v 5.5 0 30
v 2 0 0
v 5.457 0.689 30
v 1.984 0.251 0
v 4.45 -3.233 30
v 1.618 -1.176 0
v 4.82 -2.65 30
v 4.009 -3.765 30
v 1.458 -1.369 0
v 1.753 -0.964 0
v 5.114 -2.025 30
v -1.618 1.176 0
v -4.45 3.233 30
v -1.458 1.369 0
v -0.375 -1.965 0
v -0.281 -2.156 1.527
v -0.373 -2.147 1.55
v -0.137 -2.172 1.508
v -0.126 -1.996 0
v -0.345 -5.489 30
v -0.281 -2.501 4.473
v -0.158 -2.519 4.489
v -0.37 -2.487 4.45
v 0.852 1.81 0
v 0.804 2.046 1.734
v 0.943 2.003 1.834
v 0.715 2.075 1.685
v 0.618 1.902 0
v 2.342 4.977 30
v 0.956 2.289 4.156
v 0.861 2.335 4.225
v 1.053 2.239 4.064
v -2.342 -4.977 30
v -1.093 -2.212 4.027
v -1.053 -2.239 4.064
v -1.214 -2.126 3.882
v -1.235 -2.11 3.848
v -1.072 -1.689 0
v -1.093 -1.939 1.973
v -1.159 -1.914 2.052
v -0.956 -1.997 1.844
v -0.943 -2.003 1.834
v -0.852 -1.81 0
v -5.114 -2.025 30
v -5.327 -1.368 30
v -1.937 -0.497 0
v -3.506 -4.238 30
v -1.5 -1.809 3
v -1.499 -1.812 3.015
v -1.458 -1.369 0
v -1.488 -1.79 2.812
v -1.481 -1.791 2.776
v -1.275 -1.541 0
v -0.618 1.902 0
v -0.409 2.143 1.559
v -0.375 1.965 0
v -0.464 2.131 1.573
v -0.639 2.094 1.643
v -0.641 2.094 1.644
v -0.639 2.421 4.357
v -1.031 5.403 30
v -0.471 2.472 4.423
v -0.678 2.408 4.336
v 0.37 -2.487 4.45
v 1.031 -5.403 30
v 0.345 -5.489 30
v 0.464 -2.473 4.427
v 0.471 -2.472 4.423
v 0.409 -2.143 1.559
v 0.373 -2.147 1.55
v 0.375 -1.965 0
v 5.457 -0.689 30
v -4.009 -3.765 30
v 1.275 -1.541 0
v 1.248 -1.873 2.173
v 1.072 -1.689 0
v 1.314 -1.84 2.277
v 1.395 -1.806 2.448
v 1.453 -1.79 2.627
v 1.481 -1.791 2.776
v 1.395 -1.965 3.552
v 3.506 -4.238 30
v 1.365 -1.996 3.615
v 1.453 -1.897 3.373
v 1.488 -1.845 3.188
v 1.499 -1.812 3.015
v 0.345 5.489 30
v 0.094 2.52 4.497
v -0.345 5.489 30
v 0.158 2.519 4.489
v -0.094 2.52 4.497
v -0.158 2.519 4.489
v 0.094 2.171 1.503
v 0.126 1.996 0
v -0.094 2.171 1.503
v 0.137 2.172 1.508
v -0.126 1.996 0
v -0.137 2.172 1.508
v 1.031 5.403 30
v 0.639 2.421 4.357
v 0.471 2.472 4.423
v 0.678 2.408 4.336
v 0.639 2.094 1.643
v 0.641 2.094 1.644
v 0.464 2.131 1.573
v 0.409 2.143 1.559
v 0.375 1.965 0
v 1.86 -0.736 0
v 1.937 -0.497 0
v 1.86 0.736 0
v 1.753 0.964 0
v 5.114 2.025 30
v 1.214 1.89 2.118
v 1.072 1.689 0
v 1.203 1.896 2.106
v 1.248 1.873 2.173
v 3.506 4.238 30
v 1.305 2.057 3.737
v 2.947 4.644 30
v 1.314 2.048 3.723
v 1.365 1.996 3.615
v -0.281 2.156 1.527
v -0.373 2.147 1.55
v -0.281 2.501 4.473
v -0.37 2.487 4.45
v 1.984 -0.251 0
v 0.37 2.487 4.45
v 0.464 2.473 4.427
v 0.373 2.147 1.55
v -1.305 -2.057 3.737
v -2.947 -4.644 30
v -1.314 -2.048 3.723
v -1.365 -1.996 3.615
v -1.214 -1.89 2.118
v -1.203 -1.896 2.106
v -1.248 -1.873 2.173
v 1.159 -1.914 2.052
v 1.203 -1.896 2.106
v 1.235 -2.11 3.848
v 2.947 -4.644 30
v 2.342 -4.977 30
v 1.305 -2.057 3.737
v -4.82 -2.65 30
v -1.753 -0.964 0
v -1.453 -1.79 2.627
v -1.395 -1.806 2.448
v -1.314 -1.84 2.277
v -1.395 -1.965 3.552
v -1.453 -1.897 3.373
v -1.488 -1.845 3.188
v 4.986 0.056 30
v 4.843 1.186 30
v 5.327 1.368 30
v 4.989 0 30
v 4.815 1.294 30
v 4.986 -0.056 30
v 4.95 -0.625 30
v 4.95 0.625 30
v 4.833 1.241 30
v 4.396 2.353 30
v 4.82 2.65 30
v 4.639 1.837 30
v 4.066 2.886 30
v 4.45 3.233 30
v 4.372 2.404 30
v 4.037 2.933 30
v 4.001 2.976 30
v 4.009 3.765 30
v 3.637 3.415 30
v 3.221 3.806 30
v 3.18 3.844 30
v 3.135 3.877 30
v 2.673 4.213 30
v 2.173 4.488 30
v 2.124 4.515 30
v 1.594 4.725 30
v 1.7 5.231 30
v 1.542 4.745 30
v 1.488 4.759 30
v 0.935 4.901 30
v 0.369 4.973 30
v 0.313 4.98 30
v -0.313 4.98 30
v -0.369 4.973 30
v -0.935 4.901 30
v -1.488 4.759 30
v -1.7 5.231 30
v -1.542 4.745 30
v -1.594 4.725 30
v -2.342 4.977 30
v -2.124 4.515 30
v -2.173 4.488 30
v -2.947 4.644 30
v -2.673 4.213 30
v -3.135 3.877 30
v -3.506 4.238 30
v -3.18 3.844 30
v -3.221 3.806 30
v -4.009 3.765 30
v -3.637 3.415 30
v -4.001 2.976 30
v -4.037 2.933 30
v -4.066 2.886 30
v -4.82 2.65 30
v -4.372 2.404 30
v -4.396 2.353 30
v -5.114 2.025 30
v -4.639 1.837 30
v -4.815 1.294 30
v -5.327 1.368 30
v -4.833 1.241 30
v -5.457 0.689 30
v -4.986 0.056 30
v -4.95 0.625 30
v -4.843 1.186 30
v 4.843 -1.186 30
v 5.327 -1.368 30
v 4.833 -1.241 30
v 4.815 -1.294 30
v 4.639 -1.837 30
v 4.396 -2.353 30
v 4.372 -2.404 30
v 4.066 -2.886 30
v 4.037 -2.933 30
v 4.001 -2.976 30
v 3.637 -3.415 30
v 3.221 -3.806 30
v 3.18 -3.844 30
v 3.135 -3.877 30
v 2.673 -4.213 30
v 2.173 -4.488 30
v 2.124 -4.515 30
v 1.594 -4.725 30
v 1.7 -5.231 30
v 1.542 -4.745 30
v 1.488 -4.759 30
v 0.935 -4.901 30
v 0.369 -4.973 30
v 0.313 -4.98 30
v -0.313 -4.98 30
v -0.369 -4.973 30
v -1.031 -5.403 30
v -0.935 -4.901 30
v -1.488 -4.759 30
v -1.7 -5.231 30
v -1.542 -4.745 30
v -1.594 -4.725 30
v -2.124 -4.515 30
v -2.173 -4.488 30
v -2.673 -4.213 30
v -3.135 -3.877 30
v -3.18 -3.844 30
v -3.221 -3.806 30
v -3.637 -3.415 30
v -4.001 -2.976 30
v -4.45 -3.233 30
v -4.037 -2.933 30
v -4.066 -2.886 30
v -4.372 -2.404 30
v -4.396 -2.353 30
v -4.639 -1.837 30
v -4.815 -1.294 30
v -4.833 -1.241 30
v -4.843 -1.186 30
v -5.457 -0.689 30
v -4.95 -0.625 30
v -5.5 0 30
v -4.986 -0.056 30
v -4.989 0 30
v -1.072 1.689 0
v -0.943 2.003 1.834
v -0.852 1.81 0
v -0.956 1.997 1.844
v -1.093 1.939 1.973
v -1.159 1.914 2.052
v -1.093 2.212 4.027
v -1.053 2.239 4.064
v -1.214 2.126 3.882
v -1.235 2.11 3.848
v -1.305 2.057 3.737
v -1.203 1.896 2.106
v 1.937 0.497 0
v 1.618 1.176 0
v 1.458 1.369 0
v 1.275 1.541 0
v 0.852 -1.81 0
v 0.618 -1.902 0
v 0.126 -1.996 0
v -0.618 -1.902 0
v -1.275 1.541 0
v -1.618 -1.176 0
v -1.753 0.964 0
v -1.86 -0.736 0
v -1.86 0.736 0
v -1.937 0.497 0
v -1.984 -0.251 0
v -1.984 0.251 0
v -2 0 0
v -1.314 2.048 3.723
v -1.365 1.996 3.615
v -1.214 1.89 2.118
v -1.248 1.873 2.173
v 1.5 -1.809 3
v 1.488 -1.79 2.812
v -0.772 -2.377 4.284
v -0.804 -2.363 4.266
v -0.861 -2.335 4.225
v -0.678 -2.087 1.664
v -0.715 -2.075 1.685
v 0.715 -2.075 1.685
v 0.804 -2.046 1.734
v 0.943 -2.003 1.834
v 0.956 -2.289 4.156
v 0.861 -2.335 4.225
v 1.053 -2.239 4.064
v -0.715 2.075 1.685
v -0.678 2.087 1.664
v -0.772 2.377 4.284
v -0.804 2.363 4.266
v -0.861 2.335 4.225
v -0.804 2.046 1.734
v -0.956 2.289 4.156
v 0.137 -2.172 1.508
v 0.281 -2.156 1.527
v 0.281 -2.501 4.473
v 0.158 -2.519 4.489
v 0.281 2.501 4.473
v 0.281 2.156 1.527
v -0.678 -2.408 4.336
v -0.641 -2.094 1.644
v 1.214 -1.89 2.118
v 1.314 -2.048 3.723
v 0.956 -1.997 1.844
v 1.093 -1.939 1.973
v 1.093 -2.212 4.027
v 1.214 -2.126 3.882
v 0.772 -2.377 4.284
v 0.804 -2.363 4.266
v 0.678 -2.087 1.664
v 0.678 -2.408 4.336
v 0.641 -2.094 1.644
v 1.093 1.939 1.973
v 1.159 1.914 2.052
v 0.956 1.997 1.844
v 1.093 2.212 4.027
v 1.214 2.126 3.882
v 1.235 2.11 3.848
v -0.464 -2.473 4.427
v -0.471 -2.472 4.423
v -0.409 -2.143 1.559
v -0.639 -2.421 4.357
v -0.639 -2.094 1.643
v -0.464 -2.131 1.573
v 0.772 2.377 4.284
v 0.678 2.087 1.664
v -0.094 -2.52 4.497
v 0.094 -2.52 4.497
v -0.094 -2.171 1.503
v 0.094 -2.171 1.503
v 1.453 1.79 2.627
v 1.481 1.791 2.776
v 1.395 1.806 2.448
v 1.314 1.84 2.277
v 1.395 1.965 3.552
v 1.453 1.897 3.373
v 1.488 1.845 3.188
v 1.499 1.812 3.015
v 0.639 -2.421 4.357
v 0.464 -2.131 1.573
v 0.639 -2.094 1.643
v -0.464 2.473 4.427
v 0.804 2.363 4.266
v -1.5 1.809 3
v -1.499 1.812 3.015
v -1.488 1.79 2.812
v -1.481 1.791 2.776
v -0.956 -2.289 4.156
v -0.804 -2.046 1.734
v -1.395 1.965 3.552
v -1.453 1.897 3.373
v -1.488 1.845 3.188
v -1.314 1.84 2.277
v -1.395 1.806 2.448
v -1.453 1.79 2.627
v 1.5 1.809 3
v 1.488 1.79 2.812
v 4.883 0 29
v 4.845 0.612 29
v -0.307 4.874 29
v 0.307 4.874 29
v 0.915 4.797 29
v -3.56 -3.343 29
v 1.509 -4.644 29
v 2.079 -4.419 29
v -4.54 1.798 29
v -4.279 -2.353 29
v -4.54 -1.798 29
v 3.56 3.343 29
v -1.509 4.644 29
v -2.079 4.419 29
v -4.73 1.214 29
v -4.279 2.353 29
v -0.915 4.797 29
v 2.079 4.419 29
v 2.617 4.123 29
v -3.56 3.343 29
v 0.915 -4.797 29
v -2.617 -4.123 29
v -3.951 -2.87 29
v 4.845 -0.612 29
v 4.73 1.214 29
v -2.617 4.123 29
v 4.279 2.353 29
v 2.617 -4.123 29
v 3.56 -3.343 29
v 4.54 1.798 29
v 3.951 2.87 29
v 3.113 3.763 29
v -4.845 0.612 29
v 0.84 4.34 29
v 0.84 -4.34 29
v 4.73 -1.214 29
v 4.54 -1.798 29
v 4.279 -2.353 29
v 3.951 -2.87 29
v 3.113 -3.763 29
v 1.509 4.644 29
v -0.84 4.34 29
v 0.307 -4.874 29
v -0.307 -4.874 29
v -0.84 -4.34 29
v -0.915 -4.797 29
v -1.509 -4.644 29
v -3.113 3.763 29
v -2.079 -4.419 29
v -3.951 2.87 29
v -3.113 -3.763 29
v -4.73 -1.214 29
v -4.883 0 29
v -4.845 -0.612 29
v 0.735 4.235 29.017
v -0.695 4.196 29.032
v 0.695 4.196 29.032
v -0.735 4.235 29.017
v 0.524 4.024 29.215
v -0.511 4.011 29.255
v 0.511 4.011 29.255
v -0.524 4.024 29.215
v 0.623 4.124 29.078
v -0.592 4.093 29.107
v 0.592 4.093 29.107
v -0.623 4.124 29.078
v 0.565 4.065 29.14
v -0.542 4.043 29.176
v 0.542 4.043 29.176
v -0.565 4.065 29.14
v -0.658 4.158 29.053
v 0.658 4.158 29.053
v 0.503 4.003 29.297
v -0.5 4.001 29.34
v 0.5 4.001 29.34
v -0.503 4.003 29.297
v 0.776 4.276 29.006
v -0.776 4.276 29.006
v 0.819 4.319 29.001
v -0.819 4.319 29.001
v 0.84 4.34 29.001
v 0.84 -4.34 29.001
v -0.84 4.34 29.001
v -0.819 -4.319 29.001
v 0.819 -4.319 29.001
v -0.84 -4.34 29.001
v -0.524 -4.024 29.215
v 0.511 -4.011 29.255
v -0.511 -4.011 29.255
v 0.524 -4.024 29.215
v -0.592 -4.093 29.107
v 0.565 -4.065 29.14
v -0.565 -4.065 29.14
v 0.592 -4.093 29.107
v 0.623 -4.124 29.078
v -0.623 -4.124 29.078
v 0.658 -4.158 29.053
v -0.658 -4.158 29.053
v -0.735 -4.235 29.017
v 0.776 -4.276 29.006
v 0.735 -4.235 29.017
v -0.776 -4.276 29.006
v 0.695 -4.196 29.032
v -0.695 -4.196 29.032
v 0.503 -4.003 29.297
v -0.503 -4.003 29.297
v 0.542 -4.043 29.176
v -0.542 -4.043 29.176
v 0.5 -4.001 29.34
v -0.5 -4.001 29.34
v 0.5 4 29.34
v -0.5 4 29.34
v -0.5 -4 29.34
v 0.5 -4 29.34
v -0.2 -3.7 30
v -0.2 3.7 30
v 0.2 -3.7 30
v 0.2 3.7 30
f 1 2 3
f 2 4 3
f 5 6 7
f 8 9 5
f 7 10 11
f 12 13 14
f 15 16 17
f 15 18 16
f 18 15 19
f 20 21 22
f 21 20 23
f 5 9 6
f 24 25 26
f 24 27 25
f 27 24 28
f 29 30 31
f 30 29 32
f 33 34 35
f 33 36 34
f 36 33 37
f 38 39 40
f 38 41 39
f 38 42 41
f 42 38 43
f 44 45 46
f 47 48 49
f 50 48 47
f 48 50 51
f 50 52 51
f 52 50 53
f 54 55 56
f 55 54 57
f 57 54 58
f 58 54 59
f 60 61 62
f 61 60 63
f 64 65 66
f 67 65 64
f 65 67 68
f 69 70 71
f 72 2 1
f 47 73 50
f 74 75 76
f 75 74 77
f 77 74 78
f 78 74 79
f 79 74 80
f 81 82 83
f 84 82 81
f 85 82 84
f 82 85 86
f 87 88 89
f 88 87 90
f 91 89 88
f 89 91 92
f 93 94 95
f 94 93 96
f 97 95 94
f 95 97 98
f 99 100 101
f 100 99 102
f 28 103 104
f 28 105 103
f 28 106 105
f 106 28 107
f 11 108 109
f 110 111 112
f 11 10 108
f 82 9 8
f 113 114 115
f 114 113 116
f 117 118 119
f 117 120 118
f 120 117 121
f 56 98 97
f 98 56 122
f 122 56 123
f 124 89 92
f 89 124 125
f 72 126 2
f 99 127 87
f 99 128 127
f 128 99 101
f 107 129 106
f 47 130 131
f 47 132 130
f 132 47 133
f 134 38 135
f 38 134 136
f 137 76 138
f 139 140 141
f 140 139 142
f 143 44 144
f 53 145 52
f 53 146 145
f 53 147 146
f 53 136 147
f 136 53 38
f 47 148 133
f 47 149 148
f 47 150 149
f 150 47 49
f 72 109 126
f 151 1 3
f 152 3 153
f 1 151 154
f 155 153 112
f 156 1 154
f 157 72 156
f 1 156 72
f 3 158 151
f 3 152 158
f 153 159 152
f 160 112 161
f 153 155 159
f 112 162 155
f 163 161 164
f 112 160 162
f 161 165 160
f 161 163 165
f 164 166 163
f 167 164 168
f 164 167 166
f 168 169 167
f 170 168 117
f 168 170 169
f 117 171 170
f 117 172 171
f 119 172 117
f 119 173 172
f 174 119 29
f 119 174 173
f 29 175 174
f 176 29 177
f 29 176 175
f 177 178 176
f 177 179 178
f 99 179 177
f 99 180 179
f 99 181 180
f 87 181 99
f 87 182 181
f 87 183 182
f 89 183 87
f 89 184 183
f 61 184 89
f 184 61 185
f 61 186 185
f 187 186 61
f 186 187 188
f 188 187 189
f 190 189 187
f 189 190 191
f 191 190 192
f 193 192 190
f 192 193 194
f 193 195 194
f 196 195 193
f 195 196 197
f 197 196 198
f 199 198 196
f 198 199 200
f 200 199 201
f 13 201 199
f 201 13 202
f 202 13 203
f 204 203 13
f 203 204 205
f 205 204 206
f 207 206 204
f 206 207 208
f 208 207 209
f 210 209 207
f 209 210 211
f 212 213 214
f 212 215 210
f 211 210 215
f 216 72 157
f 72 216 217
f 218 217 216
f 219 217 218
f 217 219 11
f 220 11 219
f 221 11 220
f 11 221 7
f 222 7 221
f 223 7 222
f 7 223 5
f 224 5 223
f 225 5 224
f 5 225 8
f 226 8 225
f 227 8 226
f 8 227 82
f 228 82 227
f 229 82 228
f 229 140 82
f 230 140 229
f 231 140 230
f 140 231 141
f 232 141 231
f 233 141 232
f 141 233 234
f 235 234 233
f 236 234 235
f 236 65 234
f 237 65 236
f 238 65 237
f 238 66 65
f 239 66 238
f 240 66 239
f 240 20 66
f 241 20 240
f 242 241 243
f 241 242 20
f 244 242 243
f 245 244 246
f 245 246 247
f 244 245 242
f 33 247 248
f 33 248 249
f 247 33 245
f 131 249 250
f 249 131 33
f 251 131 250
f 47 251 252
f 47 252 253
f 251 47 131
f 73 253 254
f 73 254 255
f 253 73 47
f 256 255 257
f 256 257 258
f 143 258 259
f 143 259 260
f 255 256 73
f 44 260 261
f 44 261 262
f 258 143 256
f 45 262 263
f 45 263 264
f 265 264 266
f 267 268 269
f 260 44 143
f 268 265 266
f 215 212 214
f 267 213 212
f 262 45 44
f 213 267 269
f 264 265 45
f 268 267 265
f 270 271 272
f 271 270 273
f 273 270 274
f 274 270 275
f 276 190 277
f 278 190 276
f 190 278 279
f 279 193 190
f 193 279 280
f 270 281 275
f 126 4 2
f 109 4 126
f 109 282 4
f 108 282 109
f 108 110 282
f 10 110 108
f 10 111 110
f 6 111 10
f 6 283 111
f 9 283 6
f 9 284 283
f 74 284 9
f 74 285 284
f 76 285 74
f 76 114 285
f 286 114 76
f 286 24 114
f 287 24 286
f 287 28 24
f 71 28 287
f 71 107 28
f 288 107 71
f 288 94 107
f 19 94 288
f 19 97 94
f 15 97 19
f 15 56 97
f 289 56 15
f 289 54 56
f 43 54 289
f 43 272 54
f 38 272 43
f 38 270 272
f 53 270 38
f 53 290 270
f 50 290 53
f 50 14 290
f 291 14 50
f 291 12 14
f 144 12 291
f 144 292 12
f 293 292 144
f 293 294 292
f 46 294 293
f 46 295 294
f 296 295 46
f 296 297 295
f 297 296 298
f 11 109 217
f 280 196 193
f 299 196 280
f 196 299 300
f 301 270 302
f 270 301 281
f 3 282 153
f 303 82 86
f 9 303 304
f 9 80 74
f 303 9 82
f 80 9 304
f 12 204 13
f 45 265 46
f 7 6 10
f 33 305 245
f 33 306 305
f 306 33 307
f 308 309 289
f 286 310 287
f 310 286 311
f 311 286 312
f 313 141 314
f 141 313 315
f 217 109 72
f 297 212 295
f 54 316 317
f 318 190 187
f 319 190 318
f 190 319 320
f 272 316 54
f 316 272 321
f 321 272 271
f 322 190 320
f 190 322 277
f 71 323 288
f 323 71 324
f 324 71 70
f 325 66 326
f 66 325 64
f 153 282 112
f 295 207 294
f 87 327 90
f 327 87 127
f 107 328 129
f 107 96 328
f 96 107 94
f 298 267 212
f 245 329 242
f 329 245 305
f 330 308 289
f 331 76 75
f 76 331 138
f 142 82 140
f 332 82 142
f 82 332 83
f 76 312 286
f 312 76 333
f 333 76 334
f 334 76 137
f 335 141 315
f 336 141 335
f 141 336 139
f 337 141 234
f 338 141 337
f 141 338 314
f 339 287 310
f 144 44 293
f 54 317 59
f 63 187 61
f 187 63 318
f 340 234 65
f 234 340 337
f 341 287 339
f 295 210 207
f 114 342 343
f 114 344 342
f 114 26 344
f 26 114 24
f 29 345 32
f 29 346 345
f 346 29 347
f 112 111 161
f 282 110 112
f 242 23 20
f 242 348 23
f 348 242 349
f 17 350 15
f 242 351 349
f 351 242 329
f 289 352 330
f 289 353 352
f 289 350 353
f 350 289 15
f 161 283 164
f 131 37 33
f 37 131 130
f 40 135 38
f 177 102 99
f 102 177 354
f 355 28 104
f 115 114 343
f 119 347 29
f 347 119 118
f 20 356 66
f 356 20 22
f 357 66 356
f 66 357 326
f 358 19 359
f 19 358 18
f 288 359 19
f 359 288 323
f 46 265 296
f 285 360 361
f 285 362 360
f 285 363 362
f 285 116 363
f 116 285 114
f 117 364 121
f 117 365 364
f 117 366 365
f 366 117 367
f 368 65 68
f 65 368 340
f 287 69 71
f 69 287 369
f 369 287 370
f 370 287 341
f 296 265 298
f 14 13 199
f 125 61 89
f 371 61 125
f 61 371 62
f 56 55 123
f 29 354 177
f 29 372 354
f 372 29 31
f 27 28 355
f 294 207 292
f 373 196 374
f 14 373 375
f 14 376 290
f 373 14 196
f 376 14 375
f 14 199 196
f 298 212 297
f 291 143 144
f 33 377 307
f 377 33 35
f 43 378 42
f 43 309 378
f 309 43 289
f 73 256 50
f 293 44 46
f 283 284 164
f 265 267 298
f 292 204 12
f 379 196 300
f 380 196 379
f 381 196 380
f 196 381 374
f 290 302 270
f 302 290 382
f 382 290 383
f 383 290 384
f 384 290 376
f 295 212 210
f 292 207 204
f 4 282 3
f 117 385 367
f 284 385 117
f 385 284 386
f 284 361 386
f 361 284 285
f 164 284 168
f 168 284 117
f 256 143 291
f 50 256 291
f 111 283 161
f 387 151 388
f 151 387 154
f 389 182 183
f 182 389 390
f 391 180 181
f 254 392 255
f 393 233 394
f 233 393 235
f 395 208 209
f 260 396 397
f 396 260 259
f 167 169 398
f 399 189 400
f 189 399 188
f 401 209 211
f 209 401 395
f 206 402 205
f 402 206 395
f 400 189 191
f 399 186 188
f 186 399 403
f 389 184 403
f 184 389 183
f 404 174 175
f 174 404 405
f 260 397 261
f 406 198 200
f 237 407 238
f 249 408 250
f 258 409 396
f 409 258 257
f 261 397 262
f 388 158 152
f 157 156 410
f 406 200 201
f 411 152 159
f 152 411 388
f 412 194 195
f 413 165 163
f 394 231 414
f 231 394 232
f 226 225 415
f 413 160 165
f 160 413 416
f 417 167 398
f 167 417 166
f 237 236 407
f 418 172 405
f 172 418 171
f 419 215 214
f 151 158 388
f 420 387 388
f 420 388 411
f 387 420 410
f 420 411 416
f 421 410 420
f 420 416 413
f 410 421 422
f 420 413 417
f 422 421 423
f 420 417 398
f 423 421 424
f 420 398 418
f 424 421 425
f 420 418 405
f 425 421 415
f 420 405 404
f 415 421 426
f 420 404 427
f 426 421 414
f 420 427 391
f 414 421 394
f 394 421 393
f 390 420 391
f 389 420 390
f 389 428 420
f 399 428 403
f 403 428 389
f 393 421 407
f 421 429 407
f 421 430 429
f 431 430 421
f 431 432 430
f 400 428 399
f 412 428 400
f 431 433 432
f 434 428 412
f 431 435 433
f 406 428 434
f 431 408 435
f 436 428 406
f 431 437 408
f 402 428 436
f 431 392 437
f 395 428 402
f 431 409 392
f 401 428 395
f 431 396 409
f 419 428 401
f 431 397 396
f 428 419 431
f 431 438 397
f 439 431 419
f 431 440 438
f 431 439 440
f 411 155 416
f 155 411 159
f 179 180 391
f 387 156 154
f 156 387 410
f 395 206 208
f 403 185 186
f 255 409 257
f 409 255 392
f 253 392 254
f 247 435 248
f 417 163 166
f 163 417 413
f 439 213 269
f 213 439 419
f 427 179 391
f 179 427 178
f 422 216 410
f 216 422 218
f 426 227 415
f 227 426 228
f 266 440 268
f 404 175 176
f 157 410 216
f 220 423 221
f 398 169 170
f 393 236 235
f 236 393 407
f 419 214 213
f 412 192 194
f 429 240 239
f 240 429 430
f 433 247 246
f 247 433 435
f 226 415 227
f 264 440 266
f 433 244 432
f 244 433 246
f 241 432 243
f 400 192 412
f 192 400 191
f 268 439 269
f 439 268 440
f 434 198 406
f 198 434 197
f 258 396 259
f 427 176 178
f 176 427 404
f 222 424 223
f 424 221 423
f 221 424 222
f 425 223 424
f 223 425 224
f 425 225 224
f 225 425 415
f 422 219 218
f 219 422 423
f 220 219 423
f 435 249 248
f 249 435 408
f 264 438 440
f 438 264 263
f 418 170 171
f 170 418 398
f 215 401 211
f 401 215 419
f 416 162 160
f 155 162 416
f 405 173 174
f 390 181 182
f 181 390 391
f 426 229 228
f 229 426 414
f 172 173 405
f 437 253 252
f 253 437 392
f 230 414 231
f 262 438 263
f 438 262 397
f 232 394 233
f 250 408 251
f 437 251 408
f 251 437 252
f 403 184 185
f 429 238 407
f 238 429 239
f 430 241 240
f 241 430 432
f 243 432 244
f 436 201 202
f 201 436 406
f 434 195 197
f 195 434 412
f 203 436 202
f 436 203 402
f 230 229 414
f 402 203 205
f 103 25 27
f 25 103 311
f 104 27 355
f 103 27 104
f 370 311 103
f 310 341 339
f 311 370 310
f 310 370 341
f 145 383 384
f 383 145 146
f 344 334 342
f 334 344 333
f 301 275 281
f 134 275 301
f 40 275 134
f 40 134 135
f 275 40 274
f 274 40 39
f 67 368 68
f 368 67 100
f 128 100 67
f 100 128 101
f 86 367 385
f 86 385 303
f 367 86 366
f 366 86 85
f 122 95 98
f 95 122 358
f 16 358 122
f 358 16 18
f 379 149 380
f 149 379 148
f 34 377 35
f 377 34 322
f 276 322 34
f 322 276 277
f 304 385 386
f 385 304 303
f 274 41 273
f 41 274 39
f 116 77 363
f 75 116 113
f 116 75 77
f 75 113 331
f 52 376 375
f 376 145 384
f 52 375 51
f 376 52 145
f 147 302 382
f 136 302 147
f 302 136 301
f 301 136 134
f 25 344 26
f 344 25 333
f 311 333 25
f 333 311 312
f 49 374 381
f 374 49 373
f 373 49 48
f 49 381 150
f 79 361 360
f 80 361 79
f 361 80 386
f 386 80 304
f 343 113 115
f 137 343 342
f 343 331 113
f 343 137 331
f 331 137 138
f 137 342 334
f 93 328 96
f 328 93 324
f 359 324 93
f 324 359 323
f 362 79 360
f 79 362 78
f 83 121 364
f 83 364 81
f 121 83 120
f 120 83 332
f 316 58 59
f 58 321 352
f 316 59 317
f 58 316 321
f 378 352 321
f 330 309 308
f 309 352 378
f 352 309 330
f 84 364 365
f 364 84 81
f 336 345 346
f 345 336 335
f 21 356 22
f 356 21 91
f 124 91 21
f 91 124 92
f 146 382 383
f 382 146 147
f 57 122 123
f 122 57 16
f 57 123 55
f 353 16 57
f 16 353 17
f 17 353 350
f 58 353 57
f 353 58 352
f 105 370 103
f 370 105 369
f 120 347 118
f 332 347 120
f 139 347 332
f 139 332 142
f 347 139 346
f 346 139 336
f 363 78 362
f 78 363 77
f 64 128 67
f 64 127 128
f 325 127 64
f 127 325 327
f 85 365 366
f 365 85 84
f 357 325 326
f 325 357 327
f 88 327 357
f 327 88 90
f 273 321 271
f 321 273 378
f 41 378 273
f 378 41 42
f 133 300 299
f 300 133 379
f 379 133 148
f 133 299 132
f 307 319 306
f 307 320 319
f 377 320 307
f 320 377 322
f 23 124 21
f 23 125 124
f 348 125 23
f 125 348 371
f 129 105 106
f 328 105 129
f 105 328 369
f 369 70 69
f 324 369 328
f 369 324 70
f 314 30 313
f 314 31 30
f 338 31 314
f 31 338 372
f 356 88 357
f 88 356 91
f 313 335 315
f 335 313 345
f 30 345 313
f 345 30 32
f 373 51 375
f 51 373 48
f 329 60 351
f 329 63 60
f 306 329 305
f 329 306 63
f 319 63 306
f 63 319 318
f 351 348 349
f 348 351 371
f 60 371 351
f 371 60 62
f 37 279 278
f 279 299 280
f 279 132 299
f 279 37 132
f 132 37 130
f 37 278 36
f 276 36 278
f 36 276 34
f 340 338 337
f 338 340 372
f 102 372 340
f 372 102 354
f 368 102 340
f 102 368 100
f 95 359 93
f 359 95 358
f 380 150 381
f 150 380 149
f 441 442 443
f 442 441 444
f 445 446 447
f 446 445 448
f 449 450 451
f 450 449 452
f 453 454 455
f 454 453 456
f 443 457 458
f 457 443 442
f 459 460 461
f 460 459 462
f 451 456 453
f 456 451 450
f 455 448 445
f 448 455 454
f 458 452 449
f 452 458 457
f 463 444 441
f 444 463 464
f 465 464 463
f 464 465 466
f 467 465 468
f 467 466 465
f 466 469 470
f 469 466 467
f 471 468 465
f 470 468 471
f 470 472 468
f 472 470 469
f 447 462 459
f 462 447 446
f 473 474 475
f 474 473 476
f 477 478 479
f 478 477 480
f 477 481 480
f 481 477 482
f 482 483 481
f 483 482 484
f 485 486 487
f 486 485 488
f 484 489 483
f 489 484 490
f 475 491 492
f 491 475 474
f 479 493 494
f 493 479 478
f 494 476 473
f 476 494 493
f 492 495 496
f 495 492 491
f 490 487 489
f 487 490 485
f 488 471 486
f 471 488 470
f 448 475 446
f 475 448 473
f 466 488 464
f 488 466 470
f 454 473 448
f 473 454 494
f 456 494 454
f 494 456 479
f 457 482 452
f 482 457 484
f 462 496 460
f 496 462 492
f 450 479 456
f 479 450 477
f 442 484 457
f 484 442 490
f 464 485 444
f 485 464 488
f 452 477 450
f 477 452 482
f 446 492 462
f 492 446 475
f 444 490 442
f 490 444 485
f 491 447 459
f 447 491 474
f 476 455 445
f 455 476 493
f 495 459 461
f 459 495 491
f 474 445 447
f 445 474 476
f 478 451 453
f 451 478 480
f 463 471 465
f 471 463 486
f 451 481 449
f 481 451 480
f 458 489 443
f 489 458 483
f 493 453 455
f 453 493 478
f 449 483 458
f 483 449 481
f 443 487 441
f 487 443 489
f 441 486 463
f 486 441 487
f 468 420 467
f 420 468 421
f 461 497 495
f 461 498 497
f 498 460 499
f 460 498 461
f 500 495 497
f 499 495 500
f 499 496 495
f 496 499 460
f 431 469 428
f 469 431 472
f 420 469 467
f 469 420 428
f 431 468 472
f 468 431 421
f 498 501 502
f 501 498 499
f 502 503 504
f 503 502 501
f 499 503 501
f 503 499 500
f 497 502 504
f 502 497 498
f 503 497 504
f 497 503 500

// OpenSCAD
//  The amount of edges in every circle
$fn = 50;

//  The outer radius of the cylinder
Ro = 5.5;

//  The inner radius of the cylinder
Ri = 5;

//  The bottom outer radius, the whole thing will be scaled to this
Rb = 2;

//  The height of the cylinder
H = 30;

//  The depth of the cut out for the driver
depth = 1;

//  The height of the tapering part of the top of the driver
tapered = 0.66;

//  The decrease in dimension of the top part
decrease = 0.3;

//  The radius of the fillet at the bottom of the driver
fillet = 0.34;

//  The width of the base of the driver, must be smaller than 2 * Ri
driverBaseWidth = 1;

//  The length of the base of the driver, must be smaller than 2 * Ri
driverBaseLength = 8;

//  The height of the keychain hole
keyChainHeight = 3;

//  The radius of the keychain hole
keyChainRadius = 1.5;

module keyChainIdleScrewDriver(){
    delta = 0.0001;
    union(){
        difference(){
            cylinder(r1 = Rb, r2 = Ro, h = H);
            translate([0,0,H - depth]){
                cylinder(r1 = (Ro - Rb) / H * (H - depth) + Rb - Ro + Ri, r2 = Ri, h = depth + 0.1);
            }
            translate([0, -Ro - 0.1, keyChainHeight]){
                rotate([-90,0,0]){
                    cylinder(r = keyChainRadius, h = 2 * Ro + 0.2);
                }
            }
        }        
        translate([0,0,H - depth]){
            union(){
                difference(){
                    cube([driverBaseWidth + 2 * fillet, driverBaseLength + 2 * fillet, 2 * fillet], center = true);
                    translate([0,0, 2 * fillet]){
                        minkowski(){
                            difference(){
                                cube([driverBaseWidth + 4 * fillet, driverBaseLength + 4 * fillet, 2 * fillet], center = true);
                                cube([driverBaseWidth + 2 * fillet, driverBaseLength + 2 * fillet, 2 * fillet], center = true);
                            }
                            sphere(r = fillet);
                        }
                    }
                }
                translate([-driverBaseWidth / 2, -driverBaseLength / 2, 0]){
                        cube([driverBaseWidth, driverBaseLength, depth - tapered]);
                }
                translate([-driverBaseWidth / 2, -driverBaseLength / 2, depth - tapered]){
                    hull(){
                        cube([driverBaseWidth, driverBaseLength, delta]);
                        translate([decrease, decrease, tapered]){
                            cube([driverBaseWidth - 2 * decrease, driverBaseLength - 2 * decrease, delta]);
                        }
                    }
                }
            }
        }
    }
}

keyChainIdleScrewDriver();


        
        
